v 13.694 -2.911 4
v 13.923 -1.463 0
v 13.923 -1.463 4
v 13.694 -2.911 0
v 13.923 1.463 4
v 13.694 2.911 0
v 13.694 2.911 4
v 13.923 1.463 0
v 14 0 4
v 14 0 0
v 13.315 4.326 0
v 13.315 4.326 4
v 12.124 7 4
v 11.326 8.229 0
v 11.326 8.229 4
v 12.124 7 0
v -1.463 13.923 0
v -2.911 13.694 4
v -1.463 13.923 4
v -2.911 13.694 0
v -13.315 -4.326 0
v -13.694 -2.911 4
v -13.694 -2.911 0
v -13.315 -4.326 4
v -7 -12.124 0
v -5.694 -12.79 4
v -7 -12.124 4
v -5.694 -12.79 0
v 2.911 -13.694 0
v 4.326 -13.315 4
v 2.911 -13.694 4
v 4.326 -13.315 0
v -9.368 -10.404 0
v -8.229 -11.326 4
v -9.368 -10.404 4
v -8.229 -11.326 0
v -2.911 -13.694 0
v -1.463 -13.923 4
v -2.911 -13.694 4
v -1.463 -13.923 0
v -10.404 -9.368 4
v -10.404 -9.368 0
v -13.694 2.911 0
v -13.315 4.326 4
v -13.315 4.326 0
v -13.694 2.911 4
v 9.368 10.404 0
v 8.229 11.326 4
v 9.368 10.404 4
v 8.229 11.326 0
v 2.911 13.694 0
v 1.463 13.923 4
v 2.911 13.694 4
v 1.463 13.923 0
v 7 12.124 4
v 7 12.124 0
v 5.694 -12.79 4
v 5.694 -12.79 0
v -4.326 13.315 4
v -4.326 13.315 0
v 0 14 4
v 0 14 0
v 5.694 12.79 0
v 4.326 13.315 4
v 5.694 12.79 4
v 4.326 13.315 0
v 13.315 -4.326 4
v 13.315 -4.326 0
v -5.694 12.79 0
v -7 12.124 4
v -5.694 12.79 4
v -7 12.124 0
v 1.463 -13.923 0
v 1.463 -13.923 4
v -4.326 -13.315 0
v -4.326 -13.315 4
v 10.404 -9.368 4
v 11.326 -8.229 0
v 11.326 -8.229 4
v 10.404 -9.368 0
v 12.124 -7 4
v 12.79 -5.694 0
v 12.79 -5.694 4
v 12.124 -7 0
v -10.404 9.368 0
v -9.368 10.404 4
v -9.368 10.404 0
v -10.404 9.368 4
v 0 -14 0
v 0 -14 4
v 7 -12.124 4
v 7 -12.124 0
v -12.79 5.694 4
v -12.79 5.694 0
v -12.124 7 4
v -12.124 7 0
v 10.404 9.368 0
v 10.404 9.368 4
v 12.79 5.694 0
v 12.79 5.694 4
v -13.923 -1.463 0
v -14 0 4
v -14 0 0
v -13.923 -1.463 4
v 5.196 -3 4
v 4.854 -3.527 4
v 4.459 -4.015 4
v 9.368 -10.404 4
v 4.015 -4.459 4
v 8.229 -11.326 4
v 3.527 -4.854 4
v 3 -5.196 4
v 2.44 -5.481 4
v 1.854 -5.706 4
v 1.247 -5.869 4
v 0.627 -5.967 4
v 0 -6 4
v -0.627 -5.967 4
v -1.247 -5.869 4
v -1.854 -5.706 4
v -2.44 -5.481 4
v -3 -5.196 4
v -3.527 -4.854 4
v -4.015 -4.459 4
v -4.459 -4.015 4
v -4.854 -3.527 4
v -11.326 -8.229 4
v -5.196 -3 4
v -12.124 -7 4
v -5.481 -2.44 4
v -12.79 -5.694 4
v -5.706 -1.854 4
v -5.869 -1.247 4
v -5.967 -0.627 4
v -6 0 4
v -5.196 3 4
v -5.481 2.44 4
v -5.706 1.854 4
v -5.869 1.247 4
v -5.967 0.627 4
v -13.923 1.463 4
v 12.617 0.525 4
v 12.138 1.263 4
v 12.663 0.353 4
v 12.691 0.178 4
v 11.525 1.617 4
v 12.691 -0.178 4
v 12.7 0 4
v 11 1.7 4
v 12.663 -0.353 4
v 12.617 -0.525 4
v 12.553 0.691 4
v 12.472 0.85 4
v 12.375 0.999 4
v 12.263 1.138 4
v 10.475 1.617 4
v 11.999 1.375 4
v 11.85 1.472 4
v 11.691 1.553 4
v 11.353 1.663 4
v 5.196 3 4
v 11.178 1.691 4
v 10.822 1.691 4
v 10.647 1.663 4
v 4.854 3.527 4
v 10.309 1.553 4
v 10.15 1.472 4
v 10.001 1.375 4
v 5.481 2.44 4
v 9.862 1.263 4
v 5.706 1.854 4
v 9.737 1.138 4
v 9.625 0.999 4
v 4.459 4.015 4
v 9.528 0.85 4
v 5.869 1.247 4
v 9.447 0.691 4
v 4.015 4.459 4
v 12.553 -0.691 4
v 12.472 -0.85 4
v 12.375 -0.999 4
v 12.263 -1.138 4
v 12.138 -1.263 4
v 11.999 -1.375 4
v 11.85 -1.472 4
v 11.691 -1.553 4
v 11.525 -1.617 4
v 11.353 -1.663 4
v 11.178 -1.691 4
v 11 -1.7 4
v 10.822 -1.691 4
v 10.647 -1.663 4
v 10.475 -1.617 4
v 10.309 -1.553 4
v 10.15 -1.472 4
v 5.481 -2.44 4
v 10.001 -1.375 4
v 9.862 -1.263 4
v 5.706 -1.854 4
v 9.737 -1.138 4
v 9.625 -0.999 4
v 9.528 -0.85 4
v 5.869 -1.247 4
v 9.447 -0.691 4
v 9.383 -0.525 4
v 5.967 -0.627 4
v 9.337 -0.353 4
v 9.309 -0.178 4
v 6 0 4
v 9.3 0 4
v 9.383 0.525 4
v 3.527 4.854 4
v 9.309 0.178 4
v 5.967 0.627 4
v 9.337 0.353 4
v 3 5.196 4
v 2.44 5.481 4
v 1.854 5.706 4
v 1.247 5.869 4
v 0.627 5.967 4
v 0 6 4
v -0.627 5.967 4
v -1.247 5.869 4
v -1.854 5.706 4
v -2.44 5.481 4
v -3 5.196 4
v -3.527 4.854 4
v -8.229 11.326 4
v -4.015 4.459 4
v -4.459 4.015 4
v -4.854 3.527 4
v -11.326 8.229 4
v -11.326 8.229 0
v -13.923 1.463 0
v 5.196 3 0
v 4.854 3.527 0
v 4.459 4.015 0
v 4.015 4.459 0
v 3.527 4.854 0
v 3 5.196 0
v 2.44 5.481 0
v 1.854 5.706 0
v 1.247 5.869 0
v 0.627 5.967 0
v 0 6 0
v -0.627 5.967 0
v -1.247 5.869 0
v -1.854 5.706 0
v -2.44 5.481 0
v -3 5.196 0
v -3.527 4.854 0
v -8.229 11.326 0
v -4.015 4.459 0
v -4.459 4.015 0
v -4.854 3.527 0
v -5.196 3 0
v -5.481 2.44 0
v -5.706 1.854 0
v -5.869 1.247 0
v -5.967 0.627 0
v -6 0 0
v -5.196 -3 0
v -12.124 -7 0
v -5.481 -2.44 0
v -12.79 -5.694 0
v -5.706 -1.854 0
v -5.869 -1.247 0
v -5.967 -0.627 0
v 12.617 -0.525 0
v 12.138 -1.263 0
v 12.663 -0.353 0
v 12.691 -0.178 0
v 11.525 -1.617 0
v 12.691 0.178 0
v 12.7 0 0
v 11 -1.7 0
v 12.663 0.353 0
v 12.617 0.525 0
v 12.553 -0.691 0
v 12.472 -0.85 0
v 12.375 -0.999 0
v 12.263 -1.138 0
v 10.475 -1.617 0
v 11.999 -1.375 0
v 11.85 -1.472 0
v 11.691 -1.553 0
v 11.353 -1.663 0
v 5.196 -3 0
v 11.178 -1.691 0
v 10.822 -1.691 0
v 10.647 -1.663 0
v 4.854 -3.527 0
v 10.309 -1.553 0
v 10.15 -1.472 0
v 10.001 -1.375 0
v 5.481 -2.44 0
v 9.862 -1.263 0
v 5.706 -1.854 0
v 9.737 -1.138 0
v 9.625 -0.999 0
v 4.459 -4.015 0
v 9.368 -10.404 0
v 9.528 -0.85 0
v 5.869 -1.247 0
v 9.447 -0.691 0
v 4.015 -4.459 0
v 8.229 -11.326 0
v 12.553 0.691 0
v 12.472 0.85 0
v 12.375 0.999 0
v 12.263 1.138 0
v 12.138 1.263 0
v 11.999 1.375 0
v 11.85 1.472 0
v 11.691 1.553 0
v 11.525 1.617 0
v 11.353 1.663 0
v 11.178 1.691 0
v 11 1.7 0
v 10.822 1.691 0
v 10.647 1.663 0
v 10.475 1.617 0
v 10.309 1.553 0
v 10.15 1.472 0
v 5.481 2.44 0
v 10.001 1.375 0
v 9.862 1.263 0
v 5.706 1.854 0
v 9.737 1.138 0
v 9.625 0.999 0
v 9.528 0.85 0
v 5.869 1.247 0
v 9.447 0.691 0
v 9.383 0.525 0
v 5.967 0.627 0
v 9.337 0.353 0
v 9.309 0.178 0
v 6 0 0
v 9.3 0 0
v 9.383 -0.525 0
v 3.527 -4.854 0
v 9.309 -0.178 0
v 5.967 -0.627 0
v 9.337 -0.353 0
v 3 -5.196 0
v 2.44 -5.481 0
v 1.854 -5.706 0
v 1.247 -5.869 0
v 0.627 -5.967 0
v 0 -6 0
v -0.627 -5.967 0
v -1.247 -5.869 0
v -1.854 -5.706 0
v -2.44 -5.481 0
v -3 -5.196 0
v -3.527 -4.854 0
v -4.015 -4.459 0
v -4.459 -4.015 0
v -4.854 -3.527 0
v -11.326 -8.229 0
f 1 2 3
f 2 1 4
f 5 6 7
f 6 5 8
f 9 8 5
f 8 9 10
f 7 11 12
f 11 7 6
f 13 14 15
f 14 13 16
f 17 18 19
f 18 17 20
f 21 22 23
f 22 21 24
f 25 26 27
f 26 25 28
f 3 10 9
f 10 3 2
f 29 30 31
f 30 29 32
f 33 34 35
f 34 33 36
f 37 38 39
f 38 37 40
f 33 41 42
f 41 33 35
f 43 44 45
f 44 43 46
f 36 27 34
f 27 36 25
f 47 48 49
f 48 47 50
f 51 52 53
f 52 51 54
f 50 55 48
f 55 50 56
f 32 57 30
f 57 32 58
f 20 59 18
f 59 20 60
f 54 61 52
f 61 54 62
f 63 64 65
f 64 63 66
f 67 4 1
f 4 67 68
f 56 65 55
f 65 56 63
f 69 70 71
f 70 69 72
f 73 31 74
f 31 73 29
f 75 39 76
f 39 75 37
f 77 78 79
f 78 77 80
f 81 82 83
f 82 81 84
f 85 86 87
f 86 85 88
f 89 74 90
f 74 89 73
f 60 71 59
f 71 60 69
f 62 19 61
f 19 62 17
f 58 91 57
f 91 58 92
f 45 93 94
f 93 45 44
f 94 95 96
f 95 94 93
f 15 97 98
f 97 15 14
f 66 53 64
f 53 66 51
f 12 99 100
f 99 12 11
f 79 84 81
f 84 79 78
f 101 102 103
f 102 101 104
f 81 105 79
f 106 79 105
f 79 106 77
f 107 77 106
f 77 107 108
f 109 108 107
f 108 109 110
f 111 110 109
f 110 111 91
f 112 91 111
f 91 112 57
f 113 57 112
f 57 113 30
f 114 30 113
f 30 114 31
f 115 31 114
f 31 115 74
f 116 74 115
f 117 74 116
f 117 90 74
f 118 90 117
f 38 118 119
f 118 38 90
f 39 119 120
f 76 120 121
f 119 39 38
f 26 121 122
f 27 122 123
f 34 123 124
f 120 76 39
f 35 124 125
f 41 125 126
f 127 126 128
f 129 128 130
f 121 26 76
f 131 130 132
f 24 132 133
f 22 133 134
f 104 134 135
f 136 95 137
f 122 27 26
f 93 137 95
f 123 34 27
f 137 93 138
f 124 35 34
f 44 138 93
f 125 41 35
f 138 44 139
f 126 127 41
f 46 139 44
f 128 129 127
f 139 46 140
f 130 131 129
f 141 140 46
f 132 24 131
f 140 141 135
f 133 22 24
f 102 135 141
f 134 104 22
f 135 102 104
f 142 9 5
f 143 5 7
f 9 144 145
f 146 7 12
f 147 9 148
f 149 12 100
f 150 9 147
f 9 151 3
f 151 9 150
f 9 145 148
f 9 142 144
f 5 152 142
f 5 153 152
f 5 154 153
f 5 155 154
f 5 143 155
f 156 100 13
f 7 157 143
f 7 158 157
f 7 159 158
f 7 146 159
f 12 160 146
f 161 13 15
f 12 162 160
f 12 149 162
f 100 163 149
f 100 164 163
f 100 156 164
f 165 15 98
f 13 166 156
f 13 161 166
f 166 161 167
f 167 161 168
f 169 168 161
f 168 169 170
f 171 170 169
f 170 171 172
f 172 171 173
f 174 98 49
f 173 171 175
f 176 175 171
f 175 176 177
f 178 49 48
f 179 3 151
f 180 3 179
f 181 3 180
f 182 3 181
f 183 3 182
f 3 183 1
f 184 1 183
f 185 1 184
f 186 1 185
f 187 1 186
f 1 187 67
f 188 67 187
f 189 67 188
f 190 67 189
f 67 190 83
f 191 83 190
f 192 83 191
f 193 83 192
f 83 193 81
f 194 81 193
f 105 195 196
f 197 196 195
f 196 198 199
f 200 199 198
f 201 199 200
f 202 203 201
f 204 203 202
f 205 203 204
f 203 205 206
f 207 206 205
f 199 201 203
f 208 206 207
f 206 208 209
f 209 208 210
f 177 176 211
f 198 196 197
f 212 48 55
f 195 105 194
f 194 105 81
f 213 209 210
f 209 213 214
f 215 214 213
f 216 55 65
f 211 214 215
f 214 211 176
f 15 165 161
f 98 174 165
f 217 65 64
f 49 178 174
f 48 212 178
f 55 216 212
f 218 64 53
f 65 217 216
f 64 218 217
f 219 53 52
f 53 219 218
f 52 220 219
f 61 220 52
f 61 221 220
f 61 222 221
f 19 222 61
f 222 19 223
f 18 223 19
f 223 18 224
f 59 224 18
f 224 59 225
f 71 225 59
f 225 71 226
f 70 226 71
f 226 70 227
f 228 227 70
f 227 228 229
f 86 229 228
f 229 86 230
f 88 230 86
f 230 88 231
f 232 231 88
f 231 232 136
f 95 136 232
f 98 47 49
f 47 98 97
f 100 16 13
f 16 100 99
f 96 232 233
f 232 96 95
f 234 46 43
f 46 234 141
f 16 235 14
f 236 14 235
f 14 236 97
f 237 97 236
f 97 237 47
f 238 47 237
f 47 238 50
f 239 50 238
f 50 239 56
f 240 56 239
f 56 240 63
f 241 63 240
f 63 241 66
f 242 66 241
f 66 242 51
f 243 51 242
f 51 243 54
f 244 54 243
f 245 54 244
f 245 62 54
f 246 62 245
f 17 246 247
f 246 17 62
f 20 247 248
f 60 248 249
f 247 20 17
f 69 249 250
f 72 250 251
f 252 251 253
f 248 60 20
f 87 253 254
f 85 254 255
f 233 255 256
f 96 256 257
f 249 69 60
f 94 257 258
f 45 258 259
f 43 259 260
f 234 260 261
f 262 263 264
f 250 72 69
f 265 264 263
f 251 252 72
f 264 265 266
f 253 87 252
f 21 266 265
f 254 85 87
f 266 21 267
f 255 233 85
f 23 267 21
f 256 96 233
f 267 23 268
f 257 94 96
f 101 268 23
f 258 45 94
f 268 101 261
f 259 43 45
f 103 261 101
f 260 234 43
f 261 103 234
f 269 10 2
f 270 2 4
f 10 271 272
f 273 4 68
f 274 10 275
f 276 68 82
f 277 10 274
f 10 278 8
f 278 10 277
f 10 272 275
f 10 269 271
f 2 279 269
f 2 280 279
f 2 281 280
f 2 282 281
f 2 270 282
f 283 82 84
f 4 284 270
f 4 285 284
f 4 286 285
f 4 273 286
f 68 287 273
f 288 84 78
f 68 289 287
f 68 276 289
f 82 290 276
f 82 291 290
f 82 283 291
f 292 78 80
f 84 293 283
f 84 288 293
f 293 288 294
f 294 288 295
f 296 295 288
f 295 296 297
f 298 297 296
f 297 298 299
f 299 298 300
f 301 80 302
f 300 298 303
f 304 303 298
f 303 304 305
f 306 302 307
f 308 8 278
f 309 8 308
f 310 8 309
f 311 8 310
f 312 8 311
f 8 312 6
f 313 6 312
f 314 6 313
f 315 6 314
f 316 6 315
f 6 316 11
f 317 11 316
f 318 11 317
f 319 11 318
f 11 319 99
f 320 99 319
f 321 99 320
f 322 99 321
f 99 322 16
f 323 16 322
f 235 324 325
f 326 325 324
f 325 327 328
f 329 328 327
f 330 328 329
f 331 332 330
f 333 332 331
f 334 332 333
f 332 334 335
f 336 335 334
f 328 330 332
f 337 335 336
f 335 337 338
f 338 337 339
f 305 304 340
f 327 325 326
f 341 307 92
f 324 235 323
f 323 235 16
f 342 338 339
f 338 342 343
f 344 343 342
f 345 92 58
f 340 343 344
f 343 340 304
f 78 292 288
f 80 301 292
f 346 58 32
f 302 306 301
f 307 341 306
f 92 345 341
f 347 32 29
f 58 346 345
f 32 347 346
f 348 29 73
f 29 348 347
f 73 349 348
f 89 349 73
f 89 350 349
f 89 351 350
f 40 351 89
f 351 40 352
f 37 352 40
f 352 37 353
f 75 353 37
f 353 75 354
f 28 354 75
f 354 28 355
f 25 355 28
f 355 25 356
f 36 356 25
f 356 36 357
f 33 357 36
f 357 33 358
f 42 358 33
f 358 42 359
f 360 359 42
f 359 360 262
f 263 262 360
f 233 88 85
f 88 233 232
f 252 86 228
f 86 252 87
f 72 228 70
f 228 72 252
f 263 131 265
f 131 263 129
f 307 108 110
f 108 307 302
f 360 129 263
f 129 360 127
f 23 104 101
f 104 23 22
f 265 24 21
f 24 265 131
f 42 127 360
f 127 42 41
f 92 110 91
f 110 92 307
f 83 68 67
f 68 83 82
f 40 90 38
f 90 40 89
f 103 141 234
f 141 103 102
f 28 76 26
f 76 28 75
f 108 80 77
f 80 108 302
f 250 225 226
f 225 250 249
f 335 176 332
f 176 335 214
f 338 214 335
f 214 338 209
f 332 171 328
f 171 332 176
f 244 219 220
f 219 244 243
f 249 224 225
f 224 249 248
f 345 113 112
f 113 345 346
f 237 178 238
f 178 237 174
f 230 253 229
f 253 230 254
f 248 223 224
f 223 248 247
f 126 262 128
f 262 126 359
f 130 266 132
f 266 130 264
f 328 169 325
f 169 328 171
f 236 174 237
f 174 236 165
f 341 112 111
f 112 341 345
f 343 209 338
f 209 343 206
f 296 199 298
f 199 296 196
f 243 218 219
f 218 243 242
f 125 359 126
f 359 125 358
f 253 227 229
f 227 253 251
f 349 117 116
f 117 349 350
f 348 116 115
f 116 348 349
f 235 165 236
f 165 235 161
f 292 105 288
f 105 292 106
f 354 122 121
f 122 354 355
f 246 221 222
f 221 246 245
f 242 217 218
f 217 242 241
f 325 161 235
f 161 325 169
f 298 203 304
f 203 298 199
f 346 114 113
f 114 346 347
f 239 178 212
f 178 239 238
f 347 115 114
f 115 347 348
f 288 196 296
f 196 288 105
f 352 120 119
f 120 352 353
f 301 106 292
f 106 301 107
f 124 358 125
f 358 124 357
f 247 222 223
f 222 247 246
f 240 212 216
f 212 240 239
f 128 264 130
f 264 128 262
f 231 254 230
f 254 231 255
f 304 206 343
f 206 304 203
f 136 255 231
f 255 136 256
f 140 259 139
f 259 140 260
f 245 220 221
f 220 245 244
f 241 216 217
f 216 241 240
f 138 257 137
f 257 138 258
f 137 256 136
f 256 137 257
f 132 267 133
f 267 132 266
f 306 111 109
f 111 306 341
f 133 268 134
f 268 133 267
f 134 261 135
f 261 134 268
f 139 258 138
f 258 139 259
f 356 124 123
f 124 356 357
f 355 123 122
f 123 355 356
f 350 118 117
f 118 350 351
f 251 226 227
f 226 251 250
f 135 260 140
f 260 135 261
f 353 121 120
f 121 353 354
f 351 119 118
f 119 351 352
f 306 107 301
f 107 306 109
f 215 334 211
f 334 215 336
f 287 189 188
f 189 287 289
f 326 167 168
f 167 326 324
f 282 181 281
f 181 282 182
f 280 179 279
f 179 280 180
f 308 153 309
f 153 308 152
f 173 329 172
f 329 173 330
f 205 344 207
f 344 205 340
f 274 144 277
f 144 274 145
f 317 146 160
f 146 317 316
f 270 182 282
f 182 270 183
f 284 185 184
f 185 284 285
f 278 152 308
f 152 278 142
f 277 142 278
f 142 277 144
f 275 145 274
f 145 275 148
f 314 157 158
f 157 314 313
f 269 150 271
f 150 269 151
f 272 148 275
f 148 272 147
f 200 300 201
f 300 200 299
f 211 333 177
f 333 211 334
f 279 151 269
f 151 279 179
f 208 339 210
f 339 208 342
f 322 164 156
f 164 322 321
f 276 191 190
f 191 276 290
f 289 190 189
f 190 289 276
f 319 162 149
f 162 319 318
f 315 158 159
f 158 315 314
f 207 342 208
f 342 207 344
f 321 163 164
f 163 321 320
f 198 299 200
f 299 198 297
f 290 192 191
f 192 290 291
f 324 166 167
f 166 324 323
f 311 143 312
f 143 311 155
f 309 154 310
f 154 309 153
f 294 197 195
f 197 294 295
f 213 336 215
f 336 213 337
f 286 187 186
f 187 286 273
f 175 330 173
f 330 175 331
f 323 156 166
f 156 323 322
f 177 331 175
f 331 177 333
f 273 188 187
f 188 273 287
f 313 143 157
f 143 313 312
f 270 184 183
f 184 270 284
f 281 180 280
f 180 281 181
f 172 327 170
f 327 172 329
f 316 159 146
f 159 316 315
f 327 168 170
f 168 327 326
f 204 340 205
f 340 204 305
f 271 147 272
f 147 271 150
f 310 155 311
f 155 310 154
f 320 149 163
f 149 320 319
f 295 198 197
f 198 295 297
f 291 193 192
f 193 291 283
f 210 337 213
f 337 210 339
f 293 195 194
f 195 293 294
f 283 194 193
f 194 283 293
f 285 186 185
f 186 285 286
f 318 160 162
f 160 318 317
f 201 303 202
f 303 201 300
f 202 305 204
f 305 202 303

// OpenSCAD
// Closed cable guide ring.
$fn = 60;
eps = 0.02;
cable_d = 12;
outer_d = 28;
thickness = 4;
difference() { cylinder(d=outer_d,h=thickness); translate([0,0,-eps]) cylinder(d=cable_d,h=thickness+2*eps); translate([outer_d/2-3,0,-eps]) cylinder(d=3.4,h=thickness+2*eps); }
